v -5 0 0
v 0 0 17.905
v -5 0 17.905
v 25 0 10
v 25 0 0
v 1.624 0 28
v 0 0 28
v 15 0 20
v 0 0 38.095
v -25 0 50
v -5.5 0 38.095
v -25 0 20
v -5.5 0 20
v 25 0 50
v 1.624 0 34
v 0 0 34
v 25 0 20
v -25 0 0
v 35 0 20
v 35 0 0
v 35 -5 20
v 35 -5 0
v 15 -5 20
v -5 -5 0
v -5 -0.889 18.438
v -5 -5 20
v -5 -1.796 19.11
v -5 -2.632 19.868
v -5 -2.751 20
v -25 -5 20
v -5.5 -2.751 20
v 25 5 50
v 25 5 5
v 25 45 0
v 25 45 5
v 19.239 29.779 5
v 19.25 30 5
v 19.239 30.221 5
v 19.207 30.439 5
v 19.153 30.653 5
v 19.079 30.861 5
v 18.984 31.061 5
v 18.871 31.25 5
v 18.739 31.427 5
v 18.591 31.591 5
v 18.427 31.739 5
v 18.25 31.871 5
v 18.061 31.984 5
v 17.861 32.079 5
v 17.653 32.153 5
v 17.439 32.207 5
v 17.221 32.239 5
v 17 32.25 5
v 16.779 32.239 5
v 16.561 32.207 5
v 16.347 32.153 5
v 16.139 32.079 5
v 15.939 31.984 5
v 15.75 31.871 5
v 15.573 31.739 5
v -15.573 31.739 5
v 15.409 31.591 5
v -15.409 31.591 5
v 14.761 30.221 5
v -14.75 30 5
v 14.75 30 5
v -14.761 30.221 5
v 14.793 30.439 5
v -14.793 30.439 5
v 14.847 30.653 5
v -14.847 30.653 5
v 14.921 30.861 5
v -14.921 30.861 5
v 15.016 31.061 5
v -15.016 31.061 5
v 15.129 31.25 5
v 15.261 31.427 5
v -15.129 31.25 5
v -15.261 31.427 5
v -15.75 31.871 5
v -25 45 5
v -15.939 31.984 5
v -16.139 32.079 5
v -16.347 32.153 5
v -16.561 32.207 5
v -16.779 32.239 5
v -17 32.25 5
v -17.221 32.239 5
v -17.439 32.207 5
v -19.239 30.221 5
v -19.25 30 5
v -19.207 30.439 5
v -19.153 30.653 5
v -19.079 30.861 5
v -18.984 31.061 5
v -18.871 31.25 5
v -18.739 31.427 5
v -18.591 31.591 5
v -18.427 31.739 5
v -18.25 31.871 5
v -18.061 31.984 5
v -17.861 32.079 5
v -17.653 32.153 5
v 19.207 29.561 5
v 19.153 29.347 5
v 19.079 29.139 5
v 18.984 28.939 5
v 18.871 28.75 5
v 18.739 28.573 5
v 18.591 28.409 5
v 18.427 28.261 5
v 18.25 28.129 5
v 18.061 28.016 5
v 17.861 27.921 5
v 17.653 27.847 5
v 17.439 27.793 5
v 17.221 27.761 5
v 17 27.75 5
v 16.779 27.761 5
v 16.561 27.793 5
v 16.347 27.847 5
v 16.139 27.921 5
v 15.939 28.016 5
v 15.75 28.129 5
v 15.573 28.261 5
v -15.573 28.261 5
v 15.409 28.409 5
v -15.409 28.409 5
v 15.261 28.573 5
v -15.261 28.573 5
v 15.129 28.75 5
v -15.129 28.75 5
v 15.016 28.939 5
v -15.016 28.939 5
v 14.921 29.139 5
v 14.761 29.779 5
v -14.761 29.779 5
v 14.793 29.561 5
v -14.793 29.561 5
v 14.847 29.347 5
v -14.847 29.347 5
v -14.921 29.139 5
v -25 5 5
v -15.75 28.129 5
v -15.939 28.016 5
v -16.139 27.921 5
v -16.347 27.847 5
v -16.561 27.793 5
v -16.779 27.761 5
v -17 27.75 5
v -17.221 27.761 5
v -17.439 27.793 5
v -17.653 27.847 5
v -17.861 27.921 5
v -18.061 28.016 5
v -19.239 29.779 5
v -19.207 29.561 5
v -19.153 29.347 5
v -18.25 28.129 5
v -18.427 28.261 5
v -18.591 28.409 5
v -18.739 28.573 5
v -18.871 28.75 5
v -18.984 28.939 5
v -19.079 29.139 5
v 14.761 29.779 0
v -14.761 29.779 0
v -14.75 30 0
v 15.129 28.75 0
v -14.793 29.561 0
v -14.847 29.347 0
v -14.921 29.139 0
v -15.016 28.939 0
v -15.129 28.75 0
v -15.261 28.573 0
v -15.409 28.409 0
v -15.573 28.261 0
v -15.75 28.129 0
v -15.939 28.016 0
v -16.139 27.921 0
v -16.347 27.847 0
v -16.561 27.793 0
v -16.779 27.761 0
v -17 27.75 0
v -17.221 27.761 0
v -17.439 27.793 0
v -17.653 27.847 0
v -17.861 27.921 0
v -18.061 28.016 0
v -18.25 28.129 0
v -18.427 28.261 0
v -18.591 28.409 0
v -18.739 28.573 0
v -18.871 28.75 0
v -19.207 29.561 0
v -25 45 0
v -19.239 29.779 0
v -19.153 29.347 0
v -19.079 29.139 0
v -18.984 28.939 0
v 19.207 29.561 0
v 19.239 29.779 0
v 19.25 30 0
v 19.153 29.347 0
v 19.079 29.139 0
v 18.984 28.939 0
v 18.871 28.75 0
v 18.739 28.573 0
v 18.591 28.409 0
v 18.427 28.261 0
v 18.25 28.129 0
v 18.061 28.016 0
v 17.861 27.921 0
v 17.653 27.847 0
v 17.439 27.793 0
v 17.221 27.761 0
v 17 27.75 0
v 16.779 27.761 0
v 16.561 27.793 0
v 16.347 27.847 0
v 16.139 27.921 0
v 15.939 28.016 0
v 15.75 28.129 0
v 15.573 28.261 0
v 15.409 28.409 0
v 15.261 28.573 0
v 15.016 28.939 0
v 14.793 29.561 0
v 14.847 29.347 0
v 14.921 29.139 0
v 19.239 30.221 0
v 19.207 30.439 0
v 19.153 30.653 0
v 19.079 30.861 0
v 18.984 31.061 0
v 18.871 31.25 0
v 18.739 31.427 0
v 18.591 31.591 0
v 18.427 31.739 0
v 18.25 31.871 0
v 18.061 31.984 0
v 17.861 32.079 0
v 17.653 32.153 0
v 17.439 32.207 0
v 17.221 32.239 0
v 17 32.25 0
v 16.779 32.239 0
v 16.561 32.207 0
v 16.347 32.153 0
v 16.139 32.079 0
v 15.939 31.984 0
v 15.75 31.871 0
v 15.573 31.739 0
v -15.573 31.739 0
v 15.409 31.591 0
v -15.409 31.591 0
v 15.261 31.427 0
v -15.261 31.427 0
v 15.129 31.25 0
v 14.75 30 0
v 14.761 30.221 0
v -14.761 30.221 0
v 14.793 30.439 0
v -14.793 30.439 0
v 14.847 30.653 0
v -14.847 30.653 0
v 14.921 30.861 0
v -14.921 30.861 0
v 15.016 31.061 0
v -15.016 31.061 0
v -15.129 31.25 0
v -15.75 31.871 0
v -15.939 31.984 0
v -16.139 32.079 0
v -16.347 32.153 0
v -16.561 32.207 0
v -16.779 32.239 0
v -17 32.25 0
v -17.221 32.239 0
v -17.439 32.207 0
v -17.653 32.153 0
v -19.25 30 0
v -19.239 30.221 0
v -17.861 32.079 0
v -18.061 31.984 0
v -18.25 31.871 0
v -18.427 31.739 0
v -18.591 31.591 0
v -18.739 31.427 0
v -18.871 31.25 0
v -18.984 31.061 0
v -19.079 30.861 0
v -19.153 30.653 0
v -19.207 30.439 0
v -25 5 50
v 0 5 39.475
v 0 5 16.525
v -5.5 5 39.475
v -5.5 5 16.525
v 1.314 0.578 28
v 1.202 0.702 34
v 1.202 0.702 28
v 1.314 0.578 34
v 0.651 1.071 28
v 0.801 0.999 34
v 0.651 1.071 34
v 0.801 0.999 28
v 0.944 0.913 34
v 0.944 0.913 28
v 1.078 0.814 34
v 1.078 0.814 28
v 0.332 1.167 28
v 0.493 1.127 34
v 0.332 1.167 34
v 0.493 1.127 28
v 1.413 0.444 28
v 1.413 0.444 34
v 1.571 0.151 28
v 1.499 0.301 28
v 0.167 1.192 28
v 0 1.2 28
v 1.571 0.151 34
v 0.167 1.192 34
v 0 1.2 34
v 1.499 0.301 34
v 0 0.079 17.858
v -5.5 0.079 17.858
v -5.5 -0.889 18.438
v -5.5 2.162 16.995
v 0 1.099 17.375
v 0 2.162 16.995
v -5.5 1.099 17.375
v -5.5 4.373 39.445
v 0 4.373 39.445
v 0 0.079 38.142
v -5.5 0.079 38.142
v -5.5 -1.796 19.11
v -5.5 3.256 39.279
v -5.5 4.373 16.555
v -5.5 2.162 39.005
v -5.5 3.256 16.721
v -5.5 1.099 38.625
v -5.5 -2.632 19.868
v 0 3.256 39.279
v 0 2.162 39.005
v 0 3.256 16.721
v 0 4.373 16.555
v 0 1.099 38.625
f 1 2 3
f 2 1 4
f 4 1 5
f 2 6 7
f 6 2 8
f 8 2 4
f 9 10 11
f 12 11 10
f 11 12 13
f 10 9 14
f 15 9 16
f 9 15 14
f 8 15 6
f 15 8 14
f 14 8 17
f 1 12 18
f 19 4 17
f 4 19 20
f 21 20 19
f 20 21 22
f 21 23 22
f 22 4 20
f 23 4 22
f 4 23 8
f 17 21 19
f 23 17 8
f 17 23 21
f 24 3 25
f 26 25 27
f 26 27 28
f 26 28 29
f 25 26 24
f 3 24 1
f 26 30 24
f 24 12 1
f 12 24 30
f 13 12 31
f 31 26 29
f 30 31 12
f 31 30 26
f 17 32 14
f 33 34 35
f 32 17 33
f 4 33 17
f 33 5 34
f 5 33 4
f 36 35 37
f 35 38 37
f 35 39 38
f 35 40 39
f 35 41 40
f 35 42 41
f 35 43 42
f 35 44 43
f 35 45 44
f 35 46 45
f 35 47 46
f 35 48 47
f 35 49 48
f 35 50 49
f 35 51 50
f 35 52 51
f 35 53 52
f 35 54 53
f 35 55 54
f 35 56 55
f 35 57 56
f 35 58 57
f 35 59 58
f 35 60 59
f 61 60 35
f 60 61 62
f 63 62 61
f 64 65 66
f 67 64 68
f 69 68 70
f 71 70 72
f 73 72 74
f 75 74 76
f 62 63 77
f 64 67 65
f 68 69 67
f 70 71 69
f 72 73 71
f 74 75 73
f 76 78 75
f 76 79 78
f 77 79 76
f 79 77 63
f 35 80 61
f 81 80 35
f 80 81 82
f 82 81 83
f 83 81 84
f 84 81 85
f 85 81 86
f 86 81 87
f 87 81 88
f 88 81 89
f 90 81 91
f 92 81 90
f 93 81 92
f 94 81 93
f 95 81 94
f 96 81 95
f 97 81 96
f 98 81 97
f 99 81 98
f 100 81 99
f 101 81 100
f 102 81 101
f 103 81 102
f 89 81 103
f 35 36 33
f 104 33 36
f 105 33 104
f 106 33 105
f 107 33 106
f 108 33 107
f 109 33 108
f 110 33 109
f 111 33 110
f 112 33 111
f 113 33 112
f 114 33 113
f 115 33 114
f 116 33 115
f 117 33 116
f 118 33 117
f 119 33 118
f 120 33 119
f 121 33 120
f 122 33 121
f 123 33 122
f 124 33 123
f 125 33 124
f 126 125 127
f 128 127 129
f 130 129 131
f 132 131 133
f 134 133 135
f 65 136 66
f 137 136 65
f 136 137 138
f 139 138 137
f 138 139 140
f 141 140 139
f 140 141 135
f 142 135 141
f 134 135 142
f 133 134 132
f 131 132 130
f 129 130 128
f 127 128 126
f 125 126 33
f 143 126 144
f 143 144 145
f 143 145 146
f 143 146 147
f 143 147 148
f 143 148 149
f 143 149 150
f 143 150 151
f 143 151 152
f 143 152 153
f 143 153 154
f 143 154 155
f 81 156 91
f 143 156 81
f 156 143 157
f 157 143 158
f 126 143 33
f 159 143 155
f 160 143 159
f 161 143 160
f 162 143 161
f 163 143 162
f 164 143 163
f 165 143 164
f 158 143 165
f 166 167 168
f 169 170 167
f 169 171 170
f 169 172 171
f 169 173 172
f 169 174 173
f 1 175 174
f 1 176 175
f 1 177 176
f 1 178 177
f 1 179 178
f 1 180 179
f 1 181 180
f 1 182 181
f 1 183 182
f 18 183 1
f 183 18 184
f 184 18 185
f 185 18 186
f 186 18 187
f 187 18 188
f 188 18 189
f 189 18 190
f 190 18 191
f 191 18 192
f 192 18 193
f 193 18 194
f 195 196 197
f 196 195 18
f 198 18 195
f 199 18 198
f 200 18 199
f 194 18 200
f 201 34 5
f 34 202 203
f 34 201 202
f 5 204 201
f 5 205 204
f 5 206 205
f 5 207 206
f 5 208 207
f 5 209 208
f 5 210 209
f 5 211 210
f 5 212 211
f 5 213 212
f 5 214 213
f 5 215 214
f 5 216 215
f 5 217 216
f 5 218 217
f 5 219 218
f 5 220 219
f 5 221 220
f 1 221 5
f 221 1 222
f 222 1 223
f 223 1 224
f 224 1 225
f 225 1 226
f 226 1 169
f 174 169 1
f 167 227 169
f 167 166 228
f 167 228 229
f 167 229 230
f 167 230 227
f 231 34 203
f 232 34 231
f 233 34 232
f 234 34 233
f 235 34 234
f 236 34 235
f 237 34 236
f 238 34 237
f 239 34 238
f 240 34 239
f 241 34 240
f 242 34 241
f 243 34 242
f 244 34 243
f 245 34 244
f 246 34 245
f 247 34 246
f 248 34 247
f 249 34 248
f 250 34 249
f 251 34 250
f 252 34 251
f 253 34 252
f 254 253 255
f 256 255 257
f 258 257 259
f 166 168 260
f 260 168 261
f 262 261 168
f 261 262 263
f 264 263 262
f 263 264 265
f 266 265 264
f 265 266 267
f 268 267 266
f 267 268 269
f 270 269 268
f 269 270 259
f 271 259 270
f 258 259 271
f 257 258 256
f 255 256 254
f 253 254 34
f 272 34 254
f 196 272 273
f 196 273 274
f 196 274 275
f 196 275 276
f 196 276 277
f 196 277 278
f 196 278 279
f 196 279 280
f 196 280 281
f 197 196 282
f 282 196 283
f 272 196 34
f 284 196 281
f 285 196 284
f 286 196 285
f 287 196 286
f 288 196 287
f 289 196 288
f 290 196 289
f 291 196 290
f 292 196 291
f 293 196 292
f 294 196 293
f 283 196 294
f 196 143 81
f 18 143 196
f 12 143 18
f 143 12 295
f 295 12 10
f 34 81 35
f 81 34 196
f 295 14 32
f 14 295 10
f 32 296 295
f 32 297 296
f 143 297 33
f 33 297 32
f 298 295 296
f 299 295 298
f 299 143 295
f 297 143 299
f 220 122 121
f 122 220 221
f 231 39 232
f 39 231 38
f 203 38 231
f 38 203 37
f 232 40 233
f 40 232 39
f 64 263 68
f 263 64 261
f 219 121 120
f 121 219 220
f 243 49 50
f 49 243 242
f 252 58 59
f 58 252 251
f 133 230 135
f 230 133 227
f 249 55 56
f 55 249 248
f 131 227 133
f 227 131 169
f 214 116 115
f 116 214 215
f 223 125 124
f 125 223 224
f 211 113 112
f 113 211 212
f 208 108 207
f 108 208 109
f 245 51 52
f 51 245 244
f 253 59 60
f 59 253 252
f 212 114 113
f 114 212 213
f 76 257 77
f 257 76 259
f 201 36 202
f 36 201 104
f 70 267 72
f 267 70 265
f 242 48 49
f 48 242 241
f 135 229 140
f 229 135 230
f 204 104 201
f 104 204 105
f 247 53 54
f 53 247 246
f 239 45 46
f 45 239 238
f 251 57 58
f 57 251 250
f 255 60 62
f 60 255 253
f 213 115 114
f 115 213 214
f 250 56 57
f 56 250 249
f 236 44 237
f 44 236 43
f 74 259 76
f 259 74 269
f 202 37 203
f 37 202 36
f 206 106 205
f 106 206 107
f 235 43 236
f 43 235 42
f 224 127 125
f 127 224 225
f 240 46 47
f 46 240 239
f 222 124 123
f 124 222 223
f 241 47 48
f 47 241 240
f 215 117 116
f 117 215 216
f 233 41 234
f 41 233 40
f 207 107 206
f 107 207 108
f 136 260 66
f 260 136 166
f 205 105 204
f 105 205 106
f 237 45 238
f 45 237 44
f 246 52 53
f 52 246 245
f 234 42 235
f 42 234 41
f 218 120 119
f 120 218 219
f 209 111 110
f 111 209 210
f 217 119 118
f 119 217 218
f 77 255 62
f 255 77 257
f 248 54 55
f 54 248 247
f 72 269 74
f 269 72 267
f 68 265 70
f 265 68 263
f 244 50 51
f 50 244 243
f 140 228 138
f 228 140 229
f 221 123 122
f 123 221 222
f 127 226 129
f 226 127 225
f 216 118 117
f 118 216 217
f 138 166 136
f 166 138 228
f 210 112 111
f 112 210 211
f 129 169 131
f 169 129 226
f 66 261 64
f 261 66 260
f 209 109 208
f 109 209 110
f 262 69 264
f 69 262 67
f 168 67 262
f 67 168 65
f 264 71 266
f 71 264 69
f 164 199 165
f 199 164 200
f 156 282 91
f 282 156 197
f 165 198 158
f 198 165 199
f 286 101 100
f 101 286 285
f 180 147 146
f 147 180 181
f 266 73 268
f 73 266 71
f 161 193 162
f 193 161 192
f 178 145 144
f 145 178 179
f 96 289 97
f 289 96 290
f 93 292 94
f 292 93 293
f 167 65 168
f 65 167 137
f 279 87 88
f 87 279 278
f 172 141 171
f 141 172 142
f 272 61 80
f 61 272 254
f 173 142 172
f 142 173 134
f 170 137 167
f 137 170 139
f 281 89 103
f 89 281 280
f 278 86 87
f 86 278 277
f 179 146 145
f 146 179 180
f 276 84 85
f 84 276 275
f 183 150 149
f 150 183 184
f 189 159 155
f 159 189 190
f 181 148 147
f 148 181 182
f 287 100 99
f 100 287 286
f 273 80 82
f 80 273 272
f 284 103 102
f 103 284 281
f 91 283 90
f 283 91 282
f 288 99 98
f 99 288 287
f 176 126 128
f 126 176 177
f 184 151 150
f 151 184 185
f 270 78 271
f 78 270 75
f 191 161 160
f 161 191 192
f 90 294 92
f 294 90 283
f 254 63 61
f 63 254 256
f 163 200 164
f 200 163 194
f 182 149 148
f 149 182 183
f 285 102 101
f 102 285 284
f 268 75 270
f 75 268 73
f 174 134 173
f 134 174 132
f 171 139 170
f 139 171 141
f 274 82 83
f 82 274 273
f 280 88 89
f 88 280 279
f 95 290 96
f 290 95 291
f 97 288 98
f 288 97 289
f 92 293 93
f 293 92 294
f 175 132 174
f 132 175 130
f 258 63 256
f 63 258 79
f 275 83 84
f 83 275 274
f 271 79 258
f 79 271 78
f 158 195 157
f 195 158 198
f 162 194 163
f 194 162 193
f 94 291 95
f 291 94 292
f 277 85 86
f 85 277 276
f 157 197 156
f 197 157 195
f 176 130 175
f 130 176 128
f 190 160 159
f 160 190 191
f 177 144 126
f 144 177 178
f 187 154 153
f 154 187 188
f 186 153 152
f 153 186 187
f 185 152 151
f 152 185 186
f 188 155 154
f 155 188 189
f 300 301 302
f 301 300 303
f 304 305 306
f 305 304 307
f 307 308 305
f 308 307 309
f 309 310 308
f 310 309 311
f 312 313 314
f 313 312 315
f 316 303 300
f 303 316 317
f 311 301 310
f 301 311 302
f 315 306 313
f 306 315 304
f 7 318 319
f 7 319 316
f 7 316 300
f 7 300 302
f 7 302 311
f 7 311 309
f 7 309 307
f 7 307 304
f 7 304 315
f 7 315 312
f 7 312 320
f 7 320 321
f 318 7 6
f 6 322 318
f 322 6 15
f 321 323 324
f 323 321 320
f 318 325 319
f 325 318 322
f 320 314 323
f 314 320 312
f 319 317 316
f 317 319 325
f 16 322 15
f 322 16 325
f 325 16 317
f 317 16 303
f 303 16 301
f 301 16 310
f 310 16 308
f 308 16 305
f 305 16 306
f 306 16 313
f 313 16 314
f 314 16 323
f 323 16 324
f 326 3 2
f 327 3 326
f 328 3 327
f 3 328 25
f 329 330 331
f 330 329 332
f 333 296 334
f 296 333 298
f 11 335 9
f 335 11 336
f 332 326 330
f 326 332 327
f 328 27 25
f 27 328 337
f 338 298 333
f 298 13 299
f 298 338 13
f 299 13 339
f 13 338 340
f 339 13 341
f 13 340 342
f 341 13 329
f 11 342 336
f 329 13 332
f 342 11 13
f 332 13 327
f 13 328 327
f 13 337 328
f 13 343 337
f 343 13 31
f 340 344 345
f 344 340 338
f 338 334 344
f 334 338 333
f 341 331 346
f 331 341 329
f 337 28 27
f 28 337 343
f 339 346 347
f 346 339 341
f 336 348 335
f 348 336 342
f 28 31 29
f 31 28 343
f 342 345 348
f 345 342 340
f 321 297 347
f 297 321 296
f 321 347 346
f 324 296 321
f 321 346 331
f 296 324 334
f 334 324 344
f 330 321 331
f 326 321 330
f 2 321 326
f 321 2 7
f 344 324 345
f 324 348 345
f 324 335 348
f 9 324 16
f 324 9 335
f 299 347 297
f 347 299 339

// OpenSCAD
// L-shaped mounting bracket for NEMA 17 stepper motor (e.g. syringe pump)
// Print orientation: base plate on bed (z = 0), motor plate builds upward.

// ---------------- Parameters ----------------
base_x0      = -25;   // base plate x start
base_x1      = 25;    // base plate x end
base_y0      = 0;     // base plate y start
base_y1      = 45;    // base plate y end
base_t       = 5;     // base plate thickness (Z)

hole_m4_x    = -17;   // M4 through-hole x position
hole_m4_y    = 30;    // M4 through-hole y position
hole_m4_d    = 4.5;   // M4 hole diameter

motor_x0     = -25;   // motor plate x start
motor_x1     = 25;    // motor plate x end
motor_y0     = 0;     // motor plate y start
motor_y1     = 5;     // motor plate y end (thickness)
motor_h      = 50;    // motor plate height (Z)

boss_d       = 23;    // motor centring boss hole diameter
boss_x       = 0;     // boss hole x centre
boss_z       = 28;    // boss hole z centre
boss_h       = 5;     // boss hole depth (along Y)

screw_d      = 3.4;   // M3 screw hole diameter
screw_n      = 4;     // number of screw holes
screw_pitch  = 31;    // square pattern side length
screw_x0     = 0;     // screw pattern centre x
screw_z0     = 28;    // screw pattern centre z

gusset_t     = 5;     // gusset thickness (X)
gusset_leg   = 20;    // right triangle leg length (Y and Z)
gusset_x0    = -25;   // left gusset x start
gusset_x1    = 20;    // right gusset x end

eps          = 0.5;   // cutter overshoot past faces

$fn = 64;

// ---------------- Model ----------------
difference() {
    union() {
        // Base plate
        translate([base_x0, base_y0, 0])
            cube([base_x1 - base_x0, base_y1 - base_y0, base_t]);

        // Motor plate (overlaps base slightly for a solid union)
        translate([motor_x0, motor_y0, 0])
            cube([motor_x1 - motor_x0, motor_y1 - motor_y0, motor_h]);

        // Gussets: right triangle in YZ, flush with plate edges
        for (sx = [-1, 1])
            translate([sx > 0 ? gusset_x0 : gusset_x1 - gusset_t, 0, 0])
                rotate([90, 0, 0])
                    linear_extrude(height = gusset_t)
                        polygon([
                            [gusset_leg, gusset_leg],
                            [0, gusset_leg],
                            [gusset_leg, 0]
                        ]);
    }

    // Base plate through-holes (M4)
    for (sx = [-1, 1])
        translate([sx * hole_m4_x, hole_m4_y, -eps])
            cylinder(d = hole_m4_d, h = base_t + 2 * eps);

    // Motor boss hole (along Y)
    translate([boss_x, motor_y1 + eps, boss_z])
        rotate([0, -90, 0])
            cylinder(d = boss_d, h = boss_h + eps);

    // M3 screw holes on square pattern through motor plate
    for (i = [0 : screw_n - 1]) {
        x = screw_x0 + (i % 2) * screw_pitch;
        z = screw_z0 + (i / 2) * screw_pitch;
        translate([x, motor_y0 - eps, z])
            cylinder(d = screw_d, h = motor_y1 + 2 * eps);
    }
}
